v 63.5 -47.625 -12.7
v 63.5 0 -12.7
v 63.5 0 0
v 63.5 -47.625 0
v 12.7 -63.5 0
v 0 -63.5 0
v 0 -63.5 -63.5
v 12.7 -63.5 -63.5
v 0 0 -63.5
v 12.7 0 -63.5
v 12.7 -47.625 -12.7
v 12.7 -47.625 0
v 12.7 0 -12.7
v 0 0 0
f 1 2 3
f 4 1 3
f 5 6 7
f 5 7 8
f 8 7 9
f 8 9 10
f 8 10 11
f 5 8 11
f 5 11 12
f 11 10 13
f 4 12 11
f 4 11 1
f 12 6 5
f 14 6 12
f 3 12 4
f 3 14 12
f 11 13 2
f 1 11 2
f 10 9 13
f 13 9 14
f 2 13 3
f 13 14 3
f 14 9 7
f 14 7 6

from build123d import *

# Parameters (mm, degrees)
F0_W     = 12.7
F0_H     = 63.5
F1_DEPTH = 63.5
F2_W     = 63.5
F2_H     = 12.7
F3_DEPTH = 47.624812


with BuildPart() as f1:
    # F0 (on Front) → F1 (new body)
    with BuildSketch(Plane.XZ):
        with Locations((6.35, -31.75)):
            Rectangle(F0_W, F0_H)
    extrude(amount=F1_DEPTH)

    # F0 (on Front) + F2 (on Front) → F3 (join)
    with BuildSketch(Plane.XZ):
        with Locations((6.35, -31.75)):
            Rectangle(F0_W, F0_H)
    with BuildSketch(Plane.XZ):
        with Locations((31.75, -6.35)):
            Rectangle(F2_W, F2_H)
    extrude(amount=F3_DEPTH)


solid = f1.part
